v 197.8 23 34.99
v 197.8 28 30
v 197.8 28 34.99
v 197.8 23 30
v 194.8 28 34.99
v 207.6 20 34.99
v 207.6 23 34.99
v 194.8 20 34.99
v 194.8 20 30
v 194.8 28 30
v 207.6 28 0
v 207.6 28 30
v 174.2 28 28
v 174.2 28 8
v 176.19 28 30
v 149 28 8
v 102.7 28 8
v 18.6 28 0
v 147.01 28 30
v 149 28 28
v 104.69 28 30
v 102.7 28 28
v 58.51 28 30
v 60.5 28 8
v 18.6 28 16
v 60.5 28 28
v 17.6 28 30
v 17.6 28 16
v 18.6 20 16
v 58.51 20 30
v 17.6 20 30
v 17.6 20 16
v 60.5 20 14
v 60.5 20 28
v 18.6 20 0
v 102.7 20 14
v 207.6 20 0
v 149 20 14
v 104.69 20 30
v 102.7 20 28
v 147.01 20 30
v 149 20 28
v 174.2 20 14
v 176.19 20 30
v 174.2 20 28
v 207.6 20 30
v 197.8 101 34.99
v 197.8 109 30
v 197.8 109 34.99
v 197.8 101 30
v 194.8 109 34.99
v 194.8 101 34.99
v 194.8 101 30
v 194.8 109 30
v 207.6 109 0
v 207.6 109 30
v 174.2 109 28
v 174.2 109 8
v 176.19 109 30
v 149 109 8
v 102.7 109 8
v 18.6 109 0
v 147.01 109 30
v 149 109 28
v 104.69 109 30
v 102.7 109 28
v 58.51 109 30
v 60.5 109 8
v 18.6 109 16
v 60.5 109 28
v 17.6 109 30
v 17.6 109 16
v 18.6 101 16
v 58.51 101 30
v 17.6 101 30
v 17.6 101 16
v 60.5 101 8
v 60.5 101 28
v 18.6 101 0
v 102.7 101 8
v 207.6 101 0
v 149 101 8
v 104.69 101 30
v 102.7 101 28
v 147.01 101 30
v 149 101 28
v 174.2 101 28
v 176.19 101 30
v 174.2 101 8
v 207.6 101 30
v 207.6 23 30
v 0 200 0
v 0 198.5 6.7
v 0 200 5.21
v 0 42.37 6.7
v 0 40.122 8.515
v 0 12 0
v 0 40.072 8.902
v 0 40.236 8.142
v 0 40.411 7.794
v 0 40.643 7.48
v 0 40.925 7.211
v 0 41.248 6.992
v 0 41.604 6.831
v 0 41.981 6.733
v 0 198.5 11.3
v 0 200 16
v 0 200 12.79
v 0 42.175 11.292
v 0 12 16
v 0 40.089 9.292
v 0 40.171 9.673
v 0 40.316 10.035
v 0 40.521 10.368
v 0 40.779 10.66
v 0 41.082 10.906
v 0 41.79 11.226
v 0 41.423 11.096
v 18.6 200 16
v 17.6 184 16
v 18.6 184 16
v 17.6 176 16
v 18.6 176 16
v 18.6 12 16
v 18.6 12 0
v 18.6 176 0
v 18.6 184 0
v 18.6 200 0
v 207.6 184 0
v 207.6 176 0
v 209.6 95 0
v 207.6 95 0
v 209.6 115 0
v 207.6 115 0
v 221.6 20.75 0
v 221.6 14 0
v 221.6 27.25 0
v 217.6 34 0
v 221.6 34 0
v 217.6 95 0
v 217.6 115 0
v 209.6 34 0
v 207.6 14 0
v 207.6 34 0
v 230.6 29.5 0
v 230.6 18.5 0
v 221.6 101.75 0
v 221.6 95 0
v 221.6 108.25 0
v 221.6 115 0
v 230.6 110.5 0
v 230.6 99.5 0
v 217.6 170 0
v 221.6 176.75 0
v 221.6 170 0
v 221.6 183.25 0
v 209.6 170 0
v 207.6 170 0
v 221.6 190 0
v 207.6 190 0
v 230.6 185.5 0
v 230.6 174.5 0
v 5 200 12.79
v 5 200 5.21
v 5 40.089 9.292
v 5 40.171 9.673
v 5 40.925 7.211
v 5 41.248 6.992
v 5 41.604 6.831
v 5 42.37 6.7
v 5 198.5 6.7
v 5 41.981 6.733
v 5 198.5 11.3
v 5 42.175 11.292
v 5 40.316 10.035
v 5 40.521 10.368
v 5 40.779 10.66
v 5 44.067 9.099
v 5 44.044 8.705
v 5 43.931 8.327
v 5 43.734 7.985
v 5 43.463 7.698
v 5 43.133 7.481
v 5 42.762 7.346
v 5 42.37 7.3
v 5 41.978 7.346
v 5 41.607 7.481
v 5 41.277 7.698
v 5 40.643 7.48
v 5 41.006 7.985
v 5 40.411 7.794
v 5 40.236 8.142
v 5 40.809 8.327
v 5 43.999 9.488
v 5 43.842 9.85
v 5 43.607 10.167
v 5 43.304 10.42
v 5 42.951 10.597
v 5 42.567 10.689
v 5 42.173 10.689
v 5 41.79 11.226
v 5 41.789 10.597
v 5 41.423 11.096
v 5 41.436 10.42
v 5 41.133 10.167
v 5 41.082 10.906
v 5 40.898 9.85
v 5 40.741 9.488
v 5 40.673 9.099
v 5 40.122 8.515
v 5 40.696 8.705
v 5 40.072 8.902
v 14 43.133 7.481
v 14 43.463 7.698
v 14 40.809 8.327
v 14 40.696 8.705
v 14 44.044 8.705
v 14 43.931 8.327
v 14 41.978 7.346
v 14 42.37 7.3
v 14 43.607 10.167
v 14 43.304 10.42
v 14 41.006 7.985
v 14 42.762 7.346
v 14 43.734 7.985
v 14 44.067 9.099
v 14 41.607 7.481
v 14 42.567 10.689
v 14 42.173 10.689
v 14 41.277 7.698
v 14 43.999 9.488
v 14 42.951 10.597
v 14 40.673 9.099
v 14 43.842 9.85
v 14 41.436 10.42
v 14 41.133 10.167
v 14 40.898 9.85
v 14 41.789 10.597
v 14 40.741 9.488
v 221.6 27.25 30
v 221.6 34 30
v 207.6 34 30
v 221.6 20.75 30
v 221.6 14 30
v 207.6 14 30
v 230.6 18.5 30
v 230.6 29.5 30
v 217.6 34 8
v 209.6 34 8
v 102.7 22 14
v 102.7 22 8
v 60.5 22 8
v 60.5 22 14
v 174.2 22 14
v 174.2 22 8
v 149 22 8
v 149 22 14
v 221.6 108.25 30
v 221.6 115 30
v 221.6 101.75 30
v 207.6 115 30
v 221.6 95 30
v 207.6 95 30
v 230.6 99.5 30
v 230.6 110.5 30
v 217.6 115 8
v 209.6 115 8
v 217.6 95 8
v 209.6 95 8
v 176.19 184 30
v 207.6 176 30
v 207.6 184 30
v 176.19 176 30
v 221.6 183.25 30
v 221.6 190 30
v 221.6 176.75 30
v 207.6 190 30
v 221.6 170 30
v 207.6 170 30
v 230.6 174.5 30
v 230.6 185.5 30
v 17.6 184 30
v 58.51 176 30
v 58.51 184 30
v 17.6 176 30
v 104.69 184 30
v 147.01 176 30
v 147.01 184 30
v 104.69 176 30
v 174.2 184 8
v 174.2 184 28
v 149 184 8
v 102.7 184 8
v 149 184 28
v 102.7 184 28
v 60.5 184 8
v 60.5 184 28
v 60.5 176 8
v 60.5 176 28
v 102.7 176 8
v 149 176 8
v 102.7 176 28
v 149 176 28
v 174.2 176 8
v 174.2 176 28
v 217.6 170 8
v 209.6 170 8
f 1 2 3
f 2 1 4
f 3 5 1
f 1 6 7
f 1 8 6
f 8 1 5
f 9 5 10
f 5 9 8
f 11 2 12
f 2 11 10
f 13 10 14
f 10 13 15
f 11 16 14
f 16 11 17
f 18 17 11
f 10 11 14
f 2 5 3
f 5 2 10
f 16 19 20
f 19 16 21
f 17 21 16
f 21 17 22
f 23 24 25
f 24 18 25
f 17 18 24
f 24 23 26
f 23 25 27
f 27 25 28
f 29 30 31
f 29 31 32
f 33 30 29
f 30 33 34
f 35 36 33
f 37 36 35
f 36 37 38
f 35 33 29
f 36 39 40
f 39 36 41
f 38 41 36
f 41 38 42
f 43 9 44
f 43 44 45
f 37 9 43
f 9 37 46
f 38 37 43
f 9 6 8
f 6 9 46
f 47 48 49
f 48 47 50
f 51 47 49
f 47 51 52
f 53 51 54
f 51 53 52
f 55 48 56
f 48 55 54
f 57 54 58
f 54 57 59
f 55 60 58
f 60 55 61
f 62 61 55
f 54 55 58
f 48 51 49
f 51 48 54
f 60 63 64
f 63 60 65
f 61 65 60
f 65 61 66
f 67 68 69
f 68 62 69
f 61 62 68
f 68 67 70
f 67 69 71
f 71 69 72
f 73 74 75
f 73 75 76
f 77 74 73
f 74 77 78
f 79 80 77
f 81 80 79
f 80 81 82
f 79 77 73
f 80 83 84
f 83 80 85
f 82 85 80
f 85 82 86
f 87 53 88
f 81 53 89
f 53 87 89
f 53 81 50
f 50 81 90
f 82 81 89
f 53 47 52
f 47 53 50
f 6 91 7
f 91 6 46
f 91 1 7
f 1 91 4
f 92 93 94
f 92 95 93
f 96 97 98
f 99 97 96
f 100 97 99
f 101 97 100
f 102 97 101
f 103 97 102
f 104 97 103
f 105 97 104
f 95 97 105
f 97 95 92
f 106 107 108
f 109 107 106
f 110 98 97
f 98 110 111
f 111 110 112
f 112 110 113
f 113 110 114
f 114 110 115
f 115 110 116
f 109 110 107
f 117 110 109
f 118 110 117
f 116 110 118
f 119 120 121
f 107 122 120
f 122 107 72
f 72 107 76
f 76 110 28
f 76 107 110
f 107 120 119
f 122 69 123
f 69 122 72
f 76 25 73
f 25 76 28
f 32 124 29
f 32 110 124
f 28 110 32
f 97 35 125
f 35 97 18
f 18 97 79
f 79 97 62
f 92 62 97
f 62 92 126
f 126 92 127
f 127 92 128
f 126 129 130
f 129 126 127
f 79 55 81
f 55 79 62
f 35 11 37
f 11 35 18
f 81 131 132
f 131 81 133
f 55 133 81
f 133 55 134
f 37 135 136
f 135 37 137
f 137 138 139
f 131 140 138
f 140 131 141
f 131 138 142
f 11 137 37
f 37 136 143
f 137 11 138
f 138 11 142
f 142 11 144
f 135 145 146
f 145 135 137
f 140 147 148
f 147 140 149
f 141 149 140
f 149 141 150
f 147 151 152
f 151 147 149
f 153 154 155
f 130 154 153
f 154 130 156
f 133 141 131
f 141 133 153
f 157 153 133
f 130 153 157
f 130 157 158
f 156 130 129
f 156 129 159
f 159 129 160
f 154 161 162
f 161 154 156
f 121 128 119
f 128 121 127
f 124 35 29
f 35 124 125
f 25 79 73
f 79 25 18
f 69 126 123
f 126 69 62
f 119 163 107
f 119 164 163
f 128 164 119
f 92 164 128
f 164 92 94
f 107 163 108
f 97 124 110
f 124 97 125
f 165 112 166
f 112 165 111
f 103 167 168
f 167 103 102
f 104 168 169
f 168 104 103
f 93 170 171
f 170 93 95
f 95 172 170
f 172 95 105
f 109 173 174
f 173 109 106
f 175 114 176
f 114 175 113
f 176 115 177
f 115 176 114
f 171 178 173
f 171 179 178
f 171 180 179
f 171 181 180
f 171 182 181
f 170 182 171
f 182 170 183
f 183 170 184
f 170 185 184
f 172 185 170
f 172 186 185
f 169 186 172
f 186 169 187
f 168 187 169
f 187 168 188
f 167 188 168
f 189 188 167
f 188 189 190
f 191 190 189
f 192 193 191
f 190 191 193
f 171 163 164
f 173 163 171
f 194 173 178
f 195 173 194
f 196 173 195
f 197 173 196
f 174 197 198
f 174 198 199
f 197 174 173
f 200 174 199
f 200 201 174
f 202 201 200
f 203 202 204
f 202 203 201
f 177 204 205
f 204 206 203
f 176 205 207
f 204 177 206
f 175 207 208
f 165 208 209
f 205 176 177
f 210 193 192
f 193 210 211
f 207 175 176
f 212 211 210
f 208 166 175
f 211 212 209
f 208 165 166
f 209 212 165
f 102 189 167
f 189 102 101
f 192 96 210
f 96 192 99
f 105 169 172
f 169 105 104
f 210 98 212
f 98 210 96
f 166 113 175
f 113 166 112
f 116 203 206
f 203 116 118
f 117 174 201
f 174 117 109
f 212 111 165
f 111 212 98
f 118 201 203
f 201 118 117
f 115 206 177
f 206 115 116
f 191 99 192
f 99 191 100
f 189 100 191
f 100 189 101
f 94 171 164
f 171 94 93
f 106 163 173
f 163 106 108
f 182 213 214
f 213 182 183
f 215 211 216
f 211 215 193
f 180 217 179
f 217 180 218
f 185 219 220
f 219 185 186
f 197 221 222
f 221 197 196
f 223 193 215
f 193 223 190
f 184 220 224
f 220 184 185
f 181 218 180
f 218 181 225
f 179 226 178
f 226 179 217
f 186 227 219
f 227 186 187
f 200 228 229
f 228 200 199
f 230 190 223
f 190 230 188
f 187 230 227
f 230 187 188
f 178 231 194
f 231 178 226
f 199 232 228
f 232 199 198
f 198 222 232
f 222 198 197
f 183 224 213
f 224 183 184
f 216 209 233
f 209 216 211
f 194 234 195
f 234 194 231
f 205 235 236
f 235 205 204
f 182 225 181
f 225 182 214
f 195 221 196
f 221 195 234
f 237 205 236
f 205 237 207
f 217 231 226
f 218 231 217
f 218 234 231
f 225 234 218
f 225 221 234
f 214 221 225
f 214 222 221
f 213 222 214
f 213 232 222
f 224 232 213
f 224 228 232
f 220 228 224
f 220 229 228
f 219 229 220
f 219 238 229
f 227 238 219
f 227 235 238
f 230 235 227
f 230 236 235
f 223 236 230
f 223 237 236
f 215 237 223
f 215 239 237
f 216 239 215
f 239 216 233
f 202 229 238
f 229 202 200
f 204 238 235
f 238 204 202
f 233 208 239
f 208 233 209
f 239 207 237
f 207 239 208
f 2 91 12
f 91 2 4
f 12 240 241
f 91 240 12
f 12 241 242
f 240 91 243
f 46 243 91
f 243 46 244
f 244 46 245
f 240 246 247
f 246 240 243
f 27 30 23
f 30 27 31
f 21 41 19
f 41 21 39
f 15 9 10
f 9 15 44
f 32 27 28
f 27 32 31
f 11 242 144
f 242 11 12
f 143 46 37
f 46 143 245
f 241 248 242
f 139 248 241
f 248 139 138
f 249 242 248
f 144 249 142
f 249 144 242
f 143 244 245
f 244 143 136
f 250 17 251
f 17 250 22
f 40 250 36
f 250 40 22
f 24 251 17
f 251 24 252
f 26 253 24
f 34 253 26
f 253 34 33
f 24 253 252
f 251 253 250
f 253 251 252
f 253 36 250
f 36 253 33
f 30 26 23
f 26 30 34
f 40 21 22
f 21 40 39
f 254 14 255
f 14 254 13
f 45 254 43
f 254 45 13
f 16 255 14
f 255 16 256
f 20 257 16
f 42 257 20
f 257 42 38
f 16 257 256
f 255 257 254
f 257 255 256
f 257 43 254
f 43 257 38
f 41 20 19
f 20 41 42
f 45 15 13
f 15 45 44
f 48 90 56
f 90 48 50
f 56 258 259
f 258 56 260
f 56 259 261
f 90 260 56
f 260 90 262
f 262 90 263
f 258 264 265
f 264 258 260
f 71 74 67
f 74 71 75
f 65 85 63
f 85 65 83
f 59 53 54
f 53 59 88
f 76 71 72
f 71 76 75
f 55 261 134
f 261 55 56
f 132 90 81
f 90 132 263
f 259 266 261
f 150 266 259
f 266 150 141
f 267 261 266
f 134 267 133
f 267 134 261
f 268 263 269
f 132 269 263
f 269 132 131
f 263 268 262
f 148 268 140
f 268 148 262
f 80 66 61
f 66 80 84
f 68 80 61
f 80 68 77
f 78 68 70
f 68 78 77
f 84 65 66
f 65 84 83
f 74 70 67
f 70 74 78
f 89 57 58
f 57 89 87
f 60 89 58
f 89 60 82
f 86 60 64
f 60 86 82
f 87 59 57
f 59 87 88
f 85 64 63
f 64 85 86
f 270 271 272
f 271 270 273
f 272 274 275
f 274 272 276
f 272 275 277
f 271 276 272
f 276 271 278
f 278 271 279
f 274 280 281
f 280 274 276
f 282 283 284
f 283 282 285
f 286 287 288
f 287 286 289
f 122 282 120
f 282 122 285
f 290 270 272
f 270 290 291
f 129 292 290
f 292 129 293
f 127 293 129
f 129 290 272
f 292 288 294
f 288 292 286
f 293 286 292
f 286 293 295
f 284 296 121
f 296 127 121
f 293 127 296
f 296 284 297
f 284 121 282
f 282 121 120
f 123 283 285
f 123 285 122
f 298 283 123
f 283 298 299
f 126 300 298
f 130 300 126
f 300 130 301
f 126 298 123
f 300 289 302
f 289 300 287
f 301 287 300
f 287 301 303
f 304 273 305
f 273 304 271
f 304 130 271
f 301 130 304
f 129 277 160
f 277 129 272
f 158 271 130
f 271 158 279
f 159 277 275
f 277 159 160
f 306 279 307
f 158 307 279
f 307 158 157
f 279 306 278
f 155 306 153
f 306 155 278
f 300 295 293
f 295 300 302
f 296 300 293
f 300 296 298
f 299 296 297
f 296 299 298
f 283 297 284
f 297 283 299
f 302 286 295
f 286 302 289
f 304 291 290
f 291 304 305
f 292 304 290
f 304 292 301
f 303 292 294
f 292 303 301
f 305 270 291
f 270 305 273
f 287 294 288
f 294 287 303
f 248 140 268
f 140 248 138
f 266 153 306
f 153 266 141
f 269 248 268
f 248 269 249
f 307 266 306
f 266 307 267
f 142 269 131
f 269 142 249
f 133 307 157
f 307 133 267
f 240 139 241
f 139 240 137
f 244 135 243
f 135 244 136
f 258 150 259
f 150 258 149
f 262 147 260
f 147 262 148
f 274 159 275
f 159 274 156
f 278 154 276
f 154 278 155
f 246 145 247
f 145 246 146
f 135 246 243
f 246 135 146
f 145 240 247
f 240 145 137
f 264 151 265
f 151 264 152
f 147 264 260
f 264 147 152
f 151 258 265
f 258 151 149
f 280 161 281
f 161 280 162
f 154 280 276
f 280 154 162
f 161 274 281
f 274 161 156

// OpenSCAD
/* =====================================================
   Rack brick caddy — UniFi Toolless Mini Rack
   =====================================================
   A tray that slides into the bottom 2U of the U-Rack-6U-TL
   from the back and holds the compute machines' power
   bricks, so they're out of the compute bay:

     basil     80 × 175 × 41
     geek      76 × 165 × 26.5
     fireball  54 ×  96 × 24     (height × length × thickness,
                                  as they stand in the tray)

   and the HDHomeRun, lying flat on top of the beams next to
   the switch it plugs into.

   The bricks run hot, so the tray touches as little of them
   as it can:
     - each brick stands on edge, long axis front to back,
       so its two big faces are vertical and the hot air
       rises off them like a chimney,
     - it sits in a notch in each of three thin cross beams;
       the notch walls are the only contact with its faces
       (22 mm tall, 8 mm long, three per side),
     - there's no floor: air comes up from below, between
       the beams,
     - the bricks are spread across the rack with 40+ mm
       between them.
   The AC end of each brick faces the back of the rack,
   where the power strip is; the DC lead leaves the front
   end and goes up to the compute bay.

   The tray rides on the bottom slot's ledges like any
   UniFi gear: a skid on each side sits on the ledge, and a
   channel in its outer face catches that slot's side
   thumbscrew, which stops the tray at the right depth;
   then the screw is pushed in and turned into the hole at
   the channel's end to lock it. It's 442 mm
   wide, too wide for a 256 bed, so it prints as two halves
   that drop together with dovetail tabs at the centre.

   Room (from Ubiquiti's specs and our rack measurements,
   see unifi_ocd_panel.md):
     - 2U clear height is 94.4 mm (46.4 + 48); the bricks top
       out at 88, under the power strip in the next slot up.
     - Between the skids the tray stays clear of the middle
       ledge (|x| < 202.5); the skids stay under it (16 tall).
     - The tray reaches 200 mm in from the back post; the
       bottom slots' front gear is the Pro Max 16 PoE, 160 mm
       deep, out of ~450 mm.

   Coordinates: X across the rack (centred), Y in from the
   back post face, Z up from the bottom slot's ledge top.
   ===================================================== */

$fa = 2;
$fs = 0.4;

/* ── Selection (set by presets) ─────────────────────── */
part = "left";      // [left, right, fit_test, assembled, none]

/* ── Rack (measured; same numbers as unifi_ocd_panel.scad) ── */
slat_x      = 444.4 / 2;   // slat inner face
ledge_in    = 19.7;        // ledge sticks in this far from the slat
ledge_front = 10.92;       // ledge starts this far behind the post face
pin_d       = 3.98;
pin_z       = 9.0;         // above the ledge top
pin_setback = 42.37;       // behind the post face
pin_reach   = 4.5;         // in from the slat
mid_ledge_z = 48 - 1.65;   // underside of the middle ledge (2U up: 94.35)

/* ── Bricks: [name, height, length, thickness, x centre] ── */
bricks = [
    ["basil",    80,   175, 41,   -140],
    ["fireball", 54,    96, 24,    -60],
    ["geek",     76,   165, 26.5,  100],
];
brick_clear = 0.6;          // per side, in the notches

/* ── HDHomeRun (FLEX 4K: 86 × 86 × 20, per SiliconDust) ── */
// Lies flat across the back two beams, between fireball and geek, next
// to the switch it plugs into. Four low corner guides and a back stop.
hdhr      = [86, 86, 20];   // width (x), depth (y), height
hdhr_x    = 20;             // centre
hdhr_clear = 0.8;
guide_h   = 5;
guide_t   = 3;

/* ── Tray ───────────────────────────────────────────── */
side_gap  = 0.6;            // skid to slat
skid_w    = 18.6;           // skid width (sits on the ledge)
skid_h    = 16;             // stays well under the middle ledge
y0        = 12;             // tray's back end (behind the ledge start)
y1        = 200;            // tray's front end
beam_y    = [24, 105, 180]; // cross beam centres
beam_w    = 8;              // along Y
beam_h    = 30;
seat_z    = 8;              // notch floor: where the bricks stand
lip_t     = 2;              // brick stop on the back beam
lip_h     = 6;
lead      = 2;              // lead-in chamfer at the top of each notch
rail_w    = 8;              // inner rails, either side of the seam
rail_h    = 8;

/* ── Pin channel ────────────────────────────────────── */
chan_w    = 4.6;            // pin 3.98 + clearance
chan_deep = pin_reach + 0.5;
chan_lead = 1.5;            // flare at the open end
// The side "pin" is really a spring-loaded thumbscrew (M4, measured
// Ø3.98). Pushed in with nothing to bite, it springs back, so the
// channel ends in a hole it screws into. 3.4 lets an M4 tap its own
// thread in PETG; for an M4 heat-set insert make it 5.6 (and
// screw_len the insert's length + 1).
screw_d   = 3.4;
screw_len = 9;              // past the channel's floor

/* ── Centre joint (dovetail tabs, drop together) ────── */
tab_neck  = 6;
tab_head  = 11;
tab_len   = 9;
tab_clear = 0.1;            // 0.2 printed with pull-apart play
pad_w     = 20;             // beams widen to this at the seam

/* ── Derived ────────────────────────────────────────── */
skid_out = slat_x - side_gap;      // 221.6
skid_in  = skid_out - skid_w;      // 203.0
eps = 0.01;

/* ── Pieces ─────────────────────────────────────────── */
module skid(s) {
    mirror([s < 0 ? 1 : 0, 0, 0]) difference() {
        translate([skid_in, y0, 0]) cube([skid_w, y1 - y0, skid_h]);
        // channel for the side pin: open at the front end (the tray's
        // leading end as it slides in), closed where the pin stops it
        hull() {
            translate([skid_out - chan_deep, pin_setback, pin_z])
                rotate([0, 90, 0]) cylinder(d = chan_w, h = chan_deep + 1);
            translate([skid_out - chan_deep, y1 + 1, pin_z - chan_w / 2])
                cube([chan_deep + 1, eps, chan_w]);
        }
        // flare at the mouth
        translate([skid_out - chan_deep, y1, pin_z])
            hull() {
                translate([0, -chan_lead, -chan_w / 2]) cube([chan_deep + 1, eps, chan_w]);
                translate([0, eps, -chan_w / 2 - chan_lead]) cube([chan_deep + 1, eps, chan_w + 2 * chan_lead]);
            }
        // the thumbscrew's hole, at the channel's closed end
        translate([skid_out - chan_deep - screw_len, pin_setback, pin_z])
            rotate([0, 90, 0]) cylinder(d = screw_d, h = screw_len + 0.1);
    }
}

// One cross beam, with a notch for each brick. The back beam keeps a
// thin lip at its back face: the bricks butt against it.
module beam(yc, back = false) {
    difference() {
        union() {
            translate([-skid_in - 1, yc - beam_w / 2, 0]) cube([2 * skid_in + 2, beam_w, beam_h]);
            translate([-14, yc - pad_w / 2, 0]) cube([28, pad_w, beam_h]);
        }
        for (b = bricks) let(w = b[3] + 2 * brick_clear, y_cut = back ? yc - beam_w / 2 + lip_t : yc - beam_w / 2 - 1)
            translate([b[4], 0, 0]) {
                translate([-w / 2, y_cut, seat_z]) cube([w, beam_w + 2, beam_h]);
                if (back) translate([-w / 2, yc - beam_w / 2 - 1, seat_z + lip_h]) cube([w, beam_w + 2, beam_h]);
                // lead-in
                translate([0, yc - beam_w / 2 - 1, beam_h]) rotate([-90, 0, 0])
                    linear_extrude(beam_w + 2)
                        // ends just inside the notch, so it never shares an
                        // edge with the notch walls (issue #16)
                        polygon([[-w / 2 - lead, -eps], [w / 2 + lead, -eps],
                                 [w / 2 - 0.05, lead + 0.05], [-w / 2 + 0.05, lead + 0.05]]);
            }
    }
}

// Corner guides on the beam tops; the HDHomeRun's back rests against a
// stop on the back beam. Its front hangs past the middle beam a little.
module hdhr_guides() {
    w = hdhr[0] + 2 * hdhr_clear;
    for (yb = [beam_y[0], beam_y[1]], s = [-1, 1])
        translate([hdhr_x + s * (w / 2 + guide_t / 2) - guide_t / 2, yb - beam_w / 2, beam_h - eps])
            cube([guide_t, beam_w, guide_h]);
    // back stop, in two pieces so it stays clear of the centre joint
    for (r = [[hdhr_x - w / 2 - guide_t, -14], [14, hdhr_x + w / 2 + guide_t]])
        translate([r[0], beam_y[0] - beam_w / 2, beam_h - eps]) cube([r[1] - r[0], guide_t, guide_h]);
}

module frame() {
    hdhr_guides();
    for (s = [-1, 1]) skid(s);
    for (i = [0 : len(beam_y) - 1]) beam(beam_y[i], i == 0);
    // inner rails tie each half's beams together, clear of the seam
    for (s = [-1, 1]) translate([s > 0 ? 4 : -4 - rail_w, beam_y[0], 0])
        cube([rail_w, beam_y[len(beam_y) - 1] - beam_y[0], rail_h]);
}

module tab(yc, grow = 0) {
    translate([0, yc, -1]) linear_extrude(beam_h + 2)
        offset(delta = grow) polygon([[-1, -tab_neck / 2], [tab_len, -tab_head / 2],
                                      [tab_len, tab_head / 2], [-1, tab_neck / 2]]);
}

module half(s) {
    if (s < 0) {
        intersection() { frame(); translate([-300, -10, -10]) cube([300, 300, 100]); }
        intersection() { frame(); for (y = beam_y) tab(y); }
    } else {
        difference() {
            intersection() { frame(); translate([0, -10, -10]) cube([300, 300, 100]); }
            for (y = beam_y) tab(y, tab_clear);
        }
    }
}

// The last 60 mm of a skid with its pin stop, plus one joint, to check
// the fit before printing the halves.
module fit_test() {
    intersection() {
        skid(1);
        translate([skid_in - 1, y0, -1]) cube([skid_w + 2, pin_setback + 18 - y0, skid_h + 2]);
    }
    translate([0, 70, 0]) intersection() {
        half(-1);
        translate([-20, beam_y[1] - pad_w / 2 - 1, -1]) cube([40, pad_w + 2, beam_h + 2]);
    }
    translate([40, 70, 0]) intersection() {
        half(1);
        translate([-1, beam_y[1] - pad_w / 2 - 1, -1]) cube([21, pad_w + 2, beam_h + 2]);
    }
}

// The bricks and the HDHomeRun as plain boxes, in place (for scenes).
module contents() {
    color("#2a2a2a") for (b = bricks)
        translate([b[4] - b[3] / 2, beam_y[0] - beam_w / 2 + lip_t, seat_z]) cube([b[3], b[2], b[1]]);
    color("#151515") translate([hdhr_x - hdhr[0] / 2, beam_y[0] - beam_w / 2 + guide_t, beam_h])
        cube([hdhr[0], hdhr[1], hdhr[2]]);
}

/* ── Output ─────────────────────────────────────────── */
if (part == "left") {
    translate([skid_out, 0, 0]) half(-1);
} else if (part == "right") {
    half(1);
} else if (part == "fit_test") {
    translate([-skid_in, 0, 0]) fit_test();
} else if (part == "assembled") {
    half(-1);
    half(1);
}
